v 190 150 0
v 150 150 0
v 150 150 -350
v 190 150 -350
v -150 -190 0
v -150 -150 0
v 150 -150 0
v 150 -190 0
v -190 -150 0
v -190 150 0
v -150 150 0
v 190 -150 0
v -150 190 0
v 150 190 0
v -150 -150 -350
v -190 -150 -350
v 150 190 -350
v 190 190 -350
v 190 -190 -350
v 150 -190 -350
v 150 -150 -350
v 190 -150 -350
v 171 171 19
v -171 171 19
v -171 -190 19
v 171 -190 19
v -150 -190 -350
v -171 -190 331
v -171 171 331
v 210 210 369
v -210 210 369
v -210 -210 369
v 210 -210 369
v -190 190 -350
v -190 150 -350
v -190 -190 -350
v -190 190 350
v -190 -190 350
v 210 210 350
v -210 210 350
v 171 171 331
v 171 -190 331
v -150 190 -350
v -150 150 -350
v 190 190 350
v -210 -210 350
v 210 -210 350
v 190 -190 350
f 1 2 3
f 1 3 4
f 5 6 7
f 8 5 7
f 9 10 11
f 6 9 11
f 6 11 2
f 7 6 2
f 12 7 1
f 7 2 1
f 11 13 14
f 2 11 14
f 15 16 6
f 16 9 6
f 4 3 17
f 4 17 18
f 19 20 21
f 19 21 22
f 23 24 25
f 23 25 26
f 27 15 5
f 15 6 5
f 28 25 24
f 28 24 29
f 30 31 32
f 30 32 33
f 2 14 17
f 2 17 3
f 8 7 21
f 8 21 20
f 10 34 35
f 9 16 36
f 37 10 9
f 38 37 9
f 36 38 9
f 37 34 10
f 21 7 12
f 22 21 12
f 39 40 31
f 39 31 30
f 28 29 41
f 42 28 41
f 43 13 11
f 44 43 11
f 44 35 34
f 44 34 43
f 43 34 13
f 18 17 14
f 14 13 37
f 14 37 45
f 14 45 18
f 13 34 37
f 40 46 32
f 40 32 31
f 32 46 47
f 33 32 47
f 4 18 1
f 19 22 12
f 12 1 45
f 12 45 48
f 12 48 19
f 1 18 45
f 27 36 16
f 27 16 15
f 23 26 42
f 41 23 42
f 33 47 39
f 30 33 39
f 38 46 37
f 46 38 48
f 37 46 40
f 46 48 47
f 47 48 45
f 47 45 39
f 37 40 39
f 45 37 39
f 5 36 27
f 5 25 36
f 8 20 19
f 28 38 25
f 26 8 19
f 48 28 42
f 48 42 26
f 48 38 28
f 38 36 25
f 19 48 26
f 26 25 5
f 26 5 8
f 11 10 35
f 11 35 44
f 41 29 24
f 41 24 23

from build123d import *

# Parameters (mm, degrees)
F0_W      = 380
F0_H      = 380
F1_DEPTH  = 350
F2_W      = 342
F2_H      = 312
F3_DEPTH  = 361
F4_W      = 342
F4_H      = 312
F5_DEPTH  = 361
F6_W      = 40
F6_H      = 40
F7_DEPTH  = 150
F8_W      = 40
F8_H      = 40
F9_DEPTH  = 150
F10_W     = 40
F10_H     = 40
F11_DEPTH = 150
F12_W     = 40
F12_H     = 40
F13_DEPTH = 150
F14_W     = 420
F14_H     = 420
F14_W_2   = 380
F14_H_2   = 380
F15_DEPTH = 19
F16_DEPTH = 200


with BuildPart() as f1:
    # F0 (on Top) → F1 (new body)
    with BuildSketch(Plane.XY):
        Rectangle(F0_W, F0_H)
    extrude(amount=F1_DEPTH)

    # F2 (on face) → F3 (join)
    with BuildSketch(Plane.XZ.offset(190)):
        with Locations((0, 175)):
            Rectangle(F2_W, F2_H)
    extrude(amount=-F3_DEPTH)

    # F4 (on face) → F5 (cut)
    with BuildSketch(Plane.XZ.offset(190)):
        with Locations((0, 175)):
            Rectangle(F4_W, F4_H)
    extrude(amount=-F5_DEPTH, mode=Mode.SUBTRACT)

    # F6 (on face) → F7 (join)
    with BuildSketch(Plane(origin=(0, 0, 0), x_dir=(1, 0, 0), z_dir=(0, 0, -1))):
        with Locations((-170, 170)):
            Rectangle(F6_W, F6_H)
    extrude(amount=F7_DEPTH)

    # F8 (on face) → F9 (join)
    with BuildSketch(Plane(origin=(0, 0, 0), x_dir=(1, 0, 0), z_dir=(0, 0, -1))):
        with Locations((170, 170)):
            Rectangle(F8_W, F8_H)
    extrude(amount=F9_DEPTH)

    # F10 (on face) → F11 (join)
    with BuildSketch(Plane(origin=(0, 0, 0), x_dir=(1, 0, 0), z_dir=(0, 0, -1))):
        with Locations((-170, -170)):
            Rectangle(F10_W, F10_H)
    extrude(amount=F11_DEPTH)

    # F12 (on face) → F13 (join)
    with BuildSketch(Plane(origin=(0, 0, 0), x_dir=(1, 0, 0), z_dir=(0, 0, -1))):
        with Locations((170, -170)):
            Rectangle(F12_W, F12_H)
    extrude(amount=F13_DEPTH)

    # F14 (on face) → F15 (join)
    with BuildSketch(Plane.XY.offset(350)):
        Rectangle(F14_W, F14_H)
        Rectangle(F14_W_2, F14_H_2, mode=Mode.SUBTRACT)
        Rectangle(F14_W_2, F14_H_2)
    extrude(amount=F15_DEPTH)

    # F16 (add): faces of the model
    f16_faces = [f1.faces().sort_by_distance(p)[0] for p in [
        (-170, -170, -150),
        (170, -170, -150),
        (-170, 170, -150),
        (170, 170, -150),
    ]]
    extrude(f16_faces, amount=F16_DEPTH)


solid = f1.part
